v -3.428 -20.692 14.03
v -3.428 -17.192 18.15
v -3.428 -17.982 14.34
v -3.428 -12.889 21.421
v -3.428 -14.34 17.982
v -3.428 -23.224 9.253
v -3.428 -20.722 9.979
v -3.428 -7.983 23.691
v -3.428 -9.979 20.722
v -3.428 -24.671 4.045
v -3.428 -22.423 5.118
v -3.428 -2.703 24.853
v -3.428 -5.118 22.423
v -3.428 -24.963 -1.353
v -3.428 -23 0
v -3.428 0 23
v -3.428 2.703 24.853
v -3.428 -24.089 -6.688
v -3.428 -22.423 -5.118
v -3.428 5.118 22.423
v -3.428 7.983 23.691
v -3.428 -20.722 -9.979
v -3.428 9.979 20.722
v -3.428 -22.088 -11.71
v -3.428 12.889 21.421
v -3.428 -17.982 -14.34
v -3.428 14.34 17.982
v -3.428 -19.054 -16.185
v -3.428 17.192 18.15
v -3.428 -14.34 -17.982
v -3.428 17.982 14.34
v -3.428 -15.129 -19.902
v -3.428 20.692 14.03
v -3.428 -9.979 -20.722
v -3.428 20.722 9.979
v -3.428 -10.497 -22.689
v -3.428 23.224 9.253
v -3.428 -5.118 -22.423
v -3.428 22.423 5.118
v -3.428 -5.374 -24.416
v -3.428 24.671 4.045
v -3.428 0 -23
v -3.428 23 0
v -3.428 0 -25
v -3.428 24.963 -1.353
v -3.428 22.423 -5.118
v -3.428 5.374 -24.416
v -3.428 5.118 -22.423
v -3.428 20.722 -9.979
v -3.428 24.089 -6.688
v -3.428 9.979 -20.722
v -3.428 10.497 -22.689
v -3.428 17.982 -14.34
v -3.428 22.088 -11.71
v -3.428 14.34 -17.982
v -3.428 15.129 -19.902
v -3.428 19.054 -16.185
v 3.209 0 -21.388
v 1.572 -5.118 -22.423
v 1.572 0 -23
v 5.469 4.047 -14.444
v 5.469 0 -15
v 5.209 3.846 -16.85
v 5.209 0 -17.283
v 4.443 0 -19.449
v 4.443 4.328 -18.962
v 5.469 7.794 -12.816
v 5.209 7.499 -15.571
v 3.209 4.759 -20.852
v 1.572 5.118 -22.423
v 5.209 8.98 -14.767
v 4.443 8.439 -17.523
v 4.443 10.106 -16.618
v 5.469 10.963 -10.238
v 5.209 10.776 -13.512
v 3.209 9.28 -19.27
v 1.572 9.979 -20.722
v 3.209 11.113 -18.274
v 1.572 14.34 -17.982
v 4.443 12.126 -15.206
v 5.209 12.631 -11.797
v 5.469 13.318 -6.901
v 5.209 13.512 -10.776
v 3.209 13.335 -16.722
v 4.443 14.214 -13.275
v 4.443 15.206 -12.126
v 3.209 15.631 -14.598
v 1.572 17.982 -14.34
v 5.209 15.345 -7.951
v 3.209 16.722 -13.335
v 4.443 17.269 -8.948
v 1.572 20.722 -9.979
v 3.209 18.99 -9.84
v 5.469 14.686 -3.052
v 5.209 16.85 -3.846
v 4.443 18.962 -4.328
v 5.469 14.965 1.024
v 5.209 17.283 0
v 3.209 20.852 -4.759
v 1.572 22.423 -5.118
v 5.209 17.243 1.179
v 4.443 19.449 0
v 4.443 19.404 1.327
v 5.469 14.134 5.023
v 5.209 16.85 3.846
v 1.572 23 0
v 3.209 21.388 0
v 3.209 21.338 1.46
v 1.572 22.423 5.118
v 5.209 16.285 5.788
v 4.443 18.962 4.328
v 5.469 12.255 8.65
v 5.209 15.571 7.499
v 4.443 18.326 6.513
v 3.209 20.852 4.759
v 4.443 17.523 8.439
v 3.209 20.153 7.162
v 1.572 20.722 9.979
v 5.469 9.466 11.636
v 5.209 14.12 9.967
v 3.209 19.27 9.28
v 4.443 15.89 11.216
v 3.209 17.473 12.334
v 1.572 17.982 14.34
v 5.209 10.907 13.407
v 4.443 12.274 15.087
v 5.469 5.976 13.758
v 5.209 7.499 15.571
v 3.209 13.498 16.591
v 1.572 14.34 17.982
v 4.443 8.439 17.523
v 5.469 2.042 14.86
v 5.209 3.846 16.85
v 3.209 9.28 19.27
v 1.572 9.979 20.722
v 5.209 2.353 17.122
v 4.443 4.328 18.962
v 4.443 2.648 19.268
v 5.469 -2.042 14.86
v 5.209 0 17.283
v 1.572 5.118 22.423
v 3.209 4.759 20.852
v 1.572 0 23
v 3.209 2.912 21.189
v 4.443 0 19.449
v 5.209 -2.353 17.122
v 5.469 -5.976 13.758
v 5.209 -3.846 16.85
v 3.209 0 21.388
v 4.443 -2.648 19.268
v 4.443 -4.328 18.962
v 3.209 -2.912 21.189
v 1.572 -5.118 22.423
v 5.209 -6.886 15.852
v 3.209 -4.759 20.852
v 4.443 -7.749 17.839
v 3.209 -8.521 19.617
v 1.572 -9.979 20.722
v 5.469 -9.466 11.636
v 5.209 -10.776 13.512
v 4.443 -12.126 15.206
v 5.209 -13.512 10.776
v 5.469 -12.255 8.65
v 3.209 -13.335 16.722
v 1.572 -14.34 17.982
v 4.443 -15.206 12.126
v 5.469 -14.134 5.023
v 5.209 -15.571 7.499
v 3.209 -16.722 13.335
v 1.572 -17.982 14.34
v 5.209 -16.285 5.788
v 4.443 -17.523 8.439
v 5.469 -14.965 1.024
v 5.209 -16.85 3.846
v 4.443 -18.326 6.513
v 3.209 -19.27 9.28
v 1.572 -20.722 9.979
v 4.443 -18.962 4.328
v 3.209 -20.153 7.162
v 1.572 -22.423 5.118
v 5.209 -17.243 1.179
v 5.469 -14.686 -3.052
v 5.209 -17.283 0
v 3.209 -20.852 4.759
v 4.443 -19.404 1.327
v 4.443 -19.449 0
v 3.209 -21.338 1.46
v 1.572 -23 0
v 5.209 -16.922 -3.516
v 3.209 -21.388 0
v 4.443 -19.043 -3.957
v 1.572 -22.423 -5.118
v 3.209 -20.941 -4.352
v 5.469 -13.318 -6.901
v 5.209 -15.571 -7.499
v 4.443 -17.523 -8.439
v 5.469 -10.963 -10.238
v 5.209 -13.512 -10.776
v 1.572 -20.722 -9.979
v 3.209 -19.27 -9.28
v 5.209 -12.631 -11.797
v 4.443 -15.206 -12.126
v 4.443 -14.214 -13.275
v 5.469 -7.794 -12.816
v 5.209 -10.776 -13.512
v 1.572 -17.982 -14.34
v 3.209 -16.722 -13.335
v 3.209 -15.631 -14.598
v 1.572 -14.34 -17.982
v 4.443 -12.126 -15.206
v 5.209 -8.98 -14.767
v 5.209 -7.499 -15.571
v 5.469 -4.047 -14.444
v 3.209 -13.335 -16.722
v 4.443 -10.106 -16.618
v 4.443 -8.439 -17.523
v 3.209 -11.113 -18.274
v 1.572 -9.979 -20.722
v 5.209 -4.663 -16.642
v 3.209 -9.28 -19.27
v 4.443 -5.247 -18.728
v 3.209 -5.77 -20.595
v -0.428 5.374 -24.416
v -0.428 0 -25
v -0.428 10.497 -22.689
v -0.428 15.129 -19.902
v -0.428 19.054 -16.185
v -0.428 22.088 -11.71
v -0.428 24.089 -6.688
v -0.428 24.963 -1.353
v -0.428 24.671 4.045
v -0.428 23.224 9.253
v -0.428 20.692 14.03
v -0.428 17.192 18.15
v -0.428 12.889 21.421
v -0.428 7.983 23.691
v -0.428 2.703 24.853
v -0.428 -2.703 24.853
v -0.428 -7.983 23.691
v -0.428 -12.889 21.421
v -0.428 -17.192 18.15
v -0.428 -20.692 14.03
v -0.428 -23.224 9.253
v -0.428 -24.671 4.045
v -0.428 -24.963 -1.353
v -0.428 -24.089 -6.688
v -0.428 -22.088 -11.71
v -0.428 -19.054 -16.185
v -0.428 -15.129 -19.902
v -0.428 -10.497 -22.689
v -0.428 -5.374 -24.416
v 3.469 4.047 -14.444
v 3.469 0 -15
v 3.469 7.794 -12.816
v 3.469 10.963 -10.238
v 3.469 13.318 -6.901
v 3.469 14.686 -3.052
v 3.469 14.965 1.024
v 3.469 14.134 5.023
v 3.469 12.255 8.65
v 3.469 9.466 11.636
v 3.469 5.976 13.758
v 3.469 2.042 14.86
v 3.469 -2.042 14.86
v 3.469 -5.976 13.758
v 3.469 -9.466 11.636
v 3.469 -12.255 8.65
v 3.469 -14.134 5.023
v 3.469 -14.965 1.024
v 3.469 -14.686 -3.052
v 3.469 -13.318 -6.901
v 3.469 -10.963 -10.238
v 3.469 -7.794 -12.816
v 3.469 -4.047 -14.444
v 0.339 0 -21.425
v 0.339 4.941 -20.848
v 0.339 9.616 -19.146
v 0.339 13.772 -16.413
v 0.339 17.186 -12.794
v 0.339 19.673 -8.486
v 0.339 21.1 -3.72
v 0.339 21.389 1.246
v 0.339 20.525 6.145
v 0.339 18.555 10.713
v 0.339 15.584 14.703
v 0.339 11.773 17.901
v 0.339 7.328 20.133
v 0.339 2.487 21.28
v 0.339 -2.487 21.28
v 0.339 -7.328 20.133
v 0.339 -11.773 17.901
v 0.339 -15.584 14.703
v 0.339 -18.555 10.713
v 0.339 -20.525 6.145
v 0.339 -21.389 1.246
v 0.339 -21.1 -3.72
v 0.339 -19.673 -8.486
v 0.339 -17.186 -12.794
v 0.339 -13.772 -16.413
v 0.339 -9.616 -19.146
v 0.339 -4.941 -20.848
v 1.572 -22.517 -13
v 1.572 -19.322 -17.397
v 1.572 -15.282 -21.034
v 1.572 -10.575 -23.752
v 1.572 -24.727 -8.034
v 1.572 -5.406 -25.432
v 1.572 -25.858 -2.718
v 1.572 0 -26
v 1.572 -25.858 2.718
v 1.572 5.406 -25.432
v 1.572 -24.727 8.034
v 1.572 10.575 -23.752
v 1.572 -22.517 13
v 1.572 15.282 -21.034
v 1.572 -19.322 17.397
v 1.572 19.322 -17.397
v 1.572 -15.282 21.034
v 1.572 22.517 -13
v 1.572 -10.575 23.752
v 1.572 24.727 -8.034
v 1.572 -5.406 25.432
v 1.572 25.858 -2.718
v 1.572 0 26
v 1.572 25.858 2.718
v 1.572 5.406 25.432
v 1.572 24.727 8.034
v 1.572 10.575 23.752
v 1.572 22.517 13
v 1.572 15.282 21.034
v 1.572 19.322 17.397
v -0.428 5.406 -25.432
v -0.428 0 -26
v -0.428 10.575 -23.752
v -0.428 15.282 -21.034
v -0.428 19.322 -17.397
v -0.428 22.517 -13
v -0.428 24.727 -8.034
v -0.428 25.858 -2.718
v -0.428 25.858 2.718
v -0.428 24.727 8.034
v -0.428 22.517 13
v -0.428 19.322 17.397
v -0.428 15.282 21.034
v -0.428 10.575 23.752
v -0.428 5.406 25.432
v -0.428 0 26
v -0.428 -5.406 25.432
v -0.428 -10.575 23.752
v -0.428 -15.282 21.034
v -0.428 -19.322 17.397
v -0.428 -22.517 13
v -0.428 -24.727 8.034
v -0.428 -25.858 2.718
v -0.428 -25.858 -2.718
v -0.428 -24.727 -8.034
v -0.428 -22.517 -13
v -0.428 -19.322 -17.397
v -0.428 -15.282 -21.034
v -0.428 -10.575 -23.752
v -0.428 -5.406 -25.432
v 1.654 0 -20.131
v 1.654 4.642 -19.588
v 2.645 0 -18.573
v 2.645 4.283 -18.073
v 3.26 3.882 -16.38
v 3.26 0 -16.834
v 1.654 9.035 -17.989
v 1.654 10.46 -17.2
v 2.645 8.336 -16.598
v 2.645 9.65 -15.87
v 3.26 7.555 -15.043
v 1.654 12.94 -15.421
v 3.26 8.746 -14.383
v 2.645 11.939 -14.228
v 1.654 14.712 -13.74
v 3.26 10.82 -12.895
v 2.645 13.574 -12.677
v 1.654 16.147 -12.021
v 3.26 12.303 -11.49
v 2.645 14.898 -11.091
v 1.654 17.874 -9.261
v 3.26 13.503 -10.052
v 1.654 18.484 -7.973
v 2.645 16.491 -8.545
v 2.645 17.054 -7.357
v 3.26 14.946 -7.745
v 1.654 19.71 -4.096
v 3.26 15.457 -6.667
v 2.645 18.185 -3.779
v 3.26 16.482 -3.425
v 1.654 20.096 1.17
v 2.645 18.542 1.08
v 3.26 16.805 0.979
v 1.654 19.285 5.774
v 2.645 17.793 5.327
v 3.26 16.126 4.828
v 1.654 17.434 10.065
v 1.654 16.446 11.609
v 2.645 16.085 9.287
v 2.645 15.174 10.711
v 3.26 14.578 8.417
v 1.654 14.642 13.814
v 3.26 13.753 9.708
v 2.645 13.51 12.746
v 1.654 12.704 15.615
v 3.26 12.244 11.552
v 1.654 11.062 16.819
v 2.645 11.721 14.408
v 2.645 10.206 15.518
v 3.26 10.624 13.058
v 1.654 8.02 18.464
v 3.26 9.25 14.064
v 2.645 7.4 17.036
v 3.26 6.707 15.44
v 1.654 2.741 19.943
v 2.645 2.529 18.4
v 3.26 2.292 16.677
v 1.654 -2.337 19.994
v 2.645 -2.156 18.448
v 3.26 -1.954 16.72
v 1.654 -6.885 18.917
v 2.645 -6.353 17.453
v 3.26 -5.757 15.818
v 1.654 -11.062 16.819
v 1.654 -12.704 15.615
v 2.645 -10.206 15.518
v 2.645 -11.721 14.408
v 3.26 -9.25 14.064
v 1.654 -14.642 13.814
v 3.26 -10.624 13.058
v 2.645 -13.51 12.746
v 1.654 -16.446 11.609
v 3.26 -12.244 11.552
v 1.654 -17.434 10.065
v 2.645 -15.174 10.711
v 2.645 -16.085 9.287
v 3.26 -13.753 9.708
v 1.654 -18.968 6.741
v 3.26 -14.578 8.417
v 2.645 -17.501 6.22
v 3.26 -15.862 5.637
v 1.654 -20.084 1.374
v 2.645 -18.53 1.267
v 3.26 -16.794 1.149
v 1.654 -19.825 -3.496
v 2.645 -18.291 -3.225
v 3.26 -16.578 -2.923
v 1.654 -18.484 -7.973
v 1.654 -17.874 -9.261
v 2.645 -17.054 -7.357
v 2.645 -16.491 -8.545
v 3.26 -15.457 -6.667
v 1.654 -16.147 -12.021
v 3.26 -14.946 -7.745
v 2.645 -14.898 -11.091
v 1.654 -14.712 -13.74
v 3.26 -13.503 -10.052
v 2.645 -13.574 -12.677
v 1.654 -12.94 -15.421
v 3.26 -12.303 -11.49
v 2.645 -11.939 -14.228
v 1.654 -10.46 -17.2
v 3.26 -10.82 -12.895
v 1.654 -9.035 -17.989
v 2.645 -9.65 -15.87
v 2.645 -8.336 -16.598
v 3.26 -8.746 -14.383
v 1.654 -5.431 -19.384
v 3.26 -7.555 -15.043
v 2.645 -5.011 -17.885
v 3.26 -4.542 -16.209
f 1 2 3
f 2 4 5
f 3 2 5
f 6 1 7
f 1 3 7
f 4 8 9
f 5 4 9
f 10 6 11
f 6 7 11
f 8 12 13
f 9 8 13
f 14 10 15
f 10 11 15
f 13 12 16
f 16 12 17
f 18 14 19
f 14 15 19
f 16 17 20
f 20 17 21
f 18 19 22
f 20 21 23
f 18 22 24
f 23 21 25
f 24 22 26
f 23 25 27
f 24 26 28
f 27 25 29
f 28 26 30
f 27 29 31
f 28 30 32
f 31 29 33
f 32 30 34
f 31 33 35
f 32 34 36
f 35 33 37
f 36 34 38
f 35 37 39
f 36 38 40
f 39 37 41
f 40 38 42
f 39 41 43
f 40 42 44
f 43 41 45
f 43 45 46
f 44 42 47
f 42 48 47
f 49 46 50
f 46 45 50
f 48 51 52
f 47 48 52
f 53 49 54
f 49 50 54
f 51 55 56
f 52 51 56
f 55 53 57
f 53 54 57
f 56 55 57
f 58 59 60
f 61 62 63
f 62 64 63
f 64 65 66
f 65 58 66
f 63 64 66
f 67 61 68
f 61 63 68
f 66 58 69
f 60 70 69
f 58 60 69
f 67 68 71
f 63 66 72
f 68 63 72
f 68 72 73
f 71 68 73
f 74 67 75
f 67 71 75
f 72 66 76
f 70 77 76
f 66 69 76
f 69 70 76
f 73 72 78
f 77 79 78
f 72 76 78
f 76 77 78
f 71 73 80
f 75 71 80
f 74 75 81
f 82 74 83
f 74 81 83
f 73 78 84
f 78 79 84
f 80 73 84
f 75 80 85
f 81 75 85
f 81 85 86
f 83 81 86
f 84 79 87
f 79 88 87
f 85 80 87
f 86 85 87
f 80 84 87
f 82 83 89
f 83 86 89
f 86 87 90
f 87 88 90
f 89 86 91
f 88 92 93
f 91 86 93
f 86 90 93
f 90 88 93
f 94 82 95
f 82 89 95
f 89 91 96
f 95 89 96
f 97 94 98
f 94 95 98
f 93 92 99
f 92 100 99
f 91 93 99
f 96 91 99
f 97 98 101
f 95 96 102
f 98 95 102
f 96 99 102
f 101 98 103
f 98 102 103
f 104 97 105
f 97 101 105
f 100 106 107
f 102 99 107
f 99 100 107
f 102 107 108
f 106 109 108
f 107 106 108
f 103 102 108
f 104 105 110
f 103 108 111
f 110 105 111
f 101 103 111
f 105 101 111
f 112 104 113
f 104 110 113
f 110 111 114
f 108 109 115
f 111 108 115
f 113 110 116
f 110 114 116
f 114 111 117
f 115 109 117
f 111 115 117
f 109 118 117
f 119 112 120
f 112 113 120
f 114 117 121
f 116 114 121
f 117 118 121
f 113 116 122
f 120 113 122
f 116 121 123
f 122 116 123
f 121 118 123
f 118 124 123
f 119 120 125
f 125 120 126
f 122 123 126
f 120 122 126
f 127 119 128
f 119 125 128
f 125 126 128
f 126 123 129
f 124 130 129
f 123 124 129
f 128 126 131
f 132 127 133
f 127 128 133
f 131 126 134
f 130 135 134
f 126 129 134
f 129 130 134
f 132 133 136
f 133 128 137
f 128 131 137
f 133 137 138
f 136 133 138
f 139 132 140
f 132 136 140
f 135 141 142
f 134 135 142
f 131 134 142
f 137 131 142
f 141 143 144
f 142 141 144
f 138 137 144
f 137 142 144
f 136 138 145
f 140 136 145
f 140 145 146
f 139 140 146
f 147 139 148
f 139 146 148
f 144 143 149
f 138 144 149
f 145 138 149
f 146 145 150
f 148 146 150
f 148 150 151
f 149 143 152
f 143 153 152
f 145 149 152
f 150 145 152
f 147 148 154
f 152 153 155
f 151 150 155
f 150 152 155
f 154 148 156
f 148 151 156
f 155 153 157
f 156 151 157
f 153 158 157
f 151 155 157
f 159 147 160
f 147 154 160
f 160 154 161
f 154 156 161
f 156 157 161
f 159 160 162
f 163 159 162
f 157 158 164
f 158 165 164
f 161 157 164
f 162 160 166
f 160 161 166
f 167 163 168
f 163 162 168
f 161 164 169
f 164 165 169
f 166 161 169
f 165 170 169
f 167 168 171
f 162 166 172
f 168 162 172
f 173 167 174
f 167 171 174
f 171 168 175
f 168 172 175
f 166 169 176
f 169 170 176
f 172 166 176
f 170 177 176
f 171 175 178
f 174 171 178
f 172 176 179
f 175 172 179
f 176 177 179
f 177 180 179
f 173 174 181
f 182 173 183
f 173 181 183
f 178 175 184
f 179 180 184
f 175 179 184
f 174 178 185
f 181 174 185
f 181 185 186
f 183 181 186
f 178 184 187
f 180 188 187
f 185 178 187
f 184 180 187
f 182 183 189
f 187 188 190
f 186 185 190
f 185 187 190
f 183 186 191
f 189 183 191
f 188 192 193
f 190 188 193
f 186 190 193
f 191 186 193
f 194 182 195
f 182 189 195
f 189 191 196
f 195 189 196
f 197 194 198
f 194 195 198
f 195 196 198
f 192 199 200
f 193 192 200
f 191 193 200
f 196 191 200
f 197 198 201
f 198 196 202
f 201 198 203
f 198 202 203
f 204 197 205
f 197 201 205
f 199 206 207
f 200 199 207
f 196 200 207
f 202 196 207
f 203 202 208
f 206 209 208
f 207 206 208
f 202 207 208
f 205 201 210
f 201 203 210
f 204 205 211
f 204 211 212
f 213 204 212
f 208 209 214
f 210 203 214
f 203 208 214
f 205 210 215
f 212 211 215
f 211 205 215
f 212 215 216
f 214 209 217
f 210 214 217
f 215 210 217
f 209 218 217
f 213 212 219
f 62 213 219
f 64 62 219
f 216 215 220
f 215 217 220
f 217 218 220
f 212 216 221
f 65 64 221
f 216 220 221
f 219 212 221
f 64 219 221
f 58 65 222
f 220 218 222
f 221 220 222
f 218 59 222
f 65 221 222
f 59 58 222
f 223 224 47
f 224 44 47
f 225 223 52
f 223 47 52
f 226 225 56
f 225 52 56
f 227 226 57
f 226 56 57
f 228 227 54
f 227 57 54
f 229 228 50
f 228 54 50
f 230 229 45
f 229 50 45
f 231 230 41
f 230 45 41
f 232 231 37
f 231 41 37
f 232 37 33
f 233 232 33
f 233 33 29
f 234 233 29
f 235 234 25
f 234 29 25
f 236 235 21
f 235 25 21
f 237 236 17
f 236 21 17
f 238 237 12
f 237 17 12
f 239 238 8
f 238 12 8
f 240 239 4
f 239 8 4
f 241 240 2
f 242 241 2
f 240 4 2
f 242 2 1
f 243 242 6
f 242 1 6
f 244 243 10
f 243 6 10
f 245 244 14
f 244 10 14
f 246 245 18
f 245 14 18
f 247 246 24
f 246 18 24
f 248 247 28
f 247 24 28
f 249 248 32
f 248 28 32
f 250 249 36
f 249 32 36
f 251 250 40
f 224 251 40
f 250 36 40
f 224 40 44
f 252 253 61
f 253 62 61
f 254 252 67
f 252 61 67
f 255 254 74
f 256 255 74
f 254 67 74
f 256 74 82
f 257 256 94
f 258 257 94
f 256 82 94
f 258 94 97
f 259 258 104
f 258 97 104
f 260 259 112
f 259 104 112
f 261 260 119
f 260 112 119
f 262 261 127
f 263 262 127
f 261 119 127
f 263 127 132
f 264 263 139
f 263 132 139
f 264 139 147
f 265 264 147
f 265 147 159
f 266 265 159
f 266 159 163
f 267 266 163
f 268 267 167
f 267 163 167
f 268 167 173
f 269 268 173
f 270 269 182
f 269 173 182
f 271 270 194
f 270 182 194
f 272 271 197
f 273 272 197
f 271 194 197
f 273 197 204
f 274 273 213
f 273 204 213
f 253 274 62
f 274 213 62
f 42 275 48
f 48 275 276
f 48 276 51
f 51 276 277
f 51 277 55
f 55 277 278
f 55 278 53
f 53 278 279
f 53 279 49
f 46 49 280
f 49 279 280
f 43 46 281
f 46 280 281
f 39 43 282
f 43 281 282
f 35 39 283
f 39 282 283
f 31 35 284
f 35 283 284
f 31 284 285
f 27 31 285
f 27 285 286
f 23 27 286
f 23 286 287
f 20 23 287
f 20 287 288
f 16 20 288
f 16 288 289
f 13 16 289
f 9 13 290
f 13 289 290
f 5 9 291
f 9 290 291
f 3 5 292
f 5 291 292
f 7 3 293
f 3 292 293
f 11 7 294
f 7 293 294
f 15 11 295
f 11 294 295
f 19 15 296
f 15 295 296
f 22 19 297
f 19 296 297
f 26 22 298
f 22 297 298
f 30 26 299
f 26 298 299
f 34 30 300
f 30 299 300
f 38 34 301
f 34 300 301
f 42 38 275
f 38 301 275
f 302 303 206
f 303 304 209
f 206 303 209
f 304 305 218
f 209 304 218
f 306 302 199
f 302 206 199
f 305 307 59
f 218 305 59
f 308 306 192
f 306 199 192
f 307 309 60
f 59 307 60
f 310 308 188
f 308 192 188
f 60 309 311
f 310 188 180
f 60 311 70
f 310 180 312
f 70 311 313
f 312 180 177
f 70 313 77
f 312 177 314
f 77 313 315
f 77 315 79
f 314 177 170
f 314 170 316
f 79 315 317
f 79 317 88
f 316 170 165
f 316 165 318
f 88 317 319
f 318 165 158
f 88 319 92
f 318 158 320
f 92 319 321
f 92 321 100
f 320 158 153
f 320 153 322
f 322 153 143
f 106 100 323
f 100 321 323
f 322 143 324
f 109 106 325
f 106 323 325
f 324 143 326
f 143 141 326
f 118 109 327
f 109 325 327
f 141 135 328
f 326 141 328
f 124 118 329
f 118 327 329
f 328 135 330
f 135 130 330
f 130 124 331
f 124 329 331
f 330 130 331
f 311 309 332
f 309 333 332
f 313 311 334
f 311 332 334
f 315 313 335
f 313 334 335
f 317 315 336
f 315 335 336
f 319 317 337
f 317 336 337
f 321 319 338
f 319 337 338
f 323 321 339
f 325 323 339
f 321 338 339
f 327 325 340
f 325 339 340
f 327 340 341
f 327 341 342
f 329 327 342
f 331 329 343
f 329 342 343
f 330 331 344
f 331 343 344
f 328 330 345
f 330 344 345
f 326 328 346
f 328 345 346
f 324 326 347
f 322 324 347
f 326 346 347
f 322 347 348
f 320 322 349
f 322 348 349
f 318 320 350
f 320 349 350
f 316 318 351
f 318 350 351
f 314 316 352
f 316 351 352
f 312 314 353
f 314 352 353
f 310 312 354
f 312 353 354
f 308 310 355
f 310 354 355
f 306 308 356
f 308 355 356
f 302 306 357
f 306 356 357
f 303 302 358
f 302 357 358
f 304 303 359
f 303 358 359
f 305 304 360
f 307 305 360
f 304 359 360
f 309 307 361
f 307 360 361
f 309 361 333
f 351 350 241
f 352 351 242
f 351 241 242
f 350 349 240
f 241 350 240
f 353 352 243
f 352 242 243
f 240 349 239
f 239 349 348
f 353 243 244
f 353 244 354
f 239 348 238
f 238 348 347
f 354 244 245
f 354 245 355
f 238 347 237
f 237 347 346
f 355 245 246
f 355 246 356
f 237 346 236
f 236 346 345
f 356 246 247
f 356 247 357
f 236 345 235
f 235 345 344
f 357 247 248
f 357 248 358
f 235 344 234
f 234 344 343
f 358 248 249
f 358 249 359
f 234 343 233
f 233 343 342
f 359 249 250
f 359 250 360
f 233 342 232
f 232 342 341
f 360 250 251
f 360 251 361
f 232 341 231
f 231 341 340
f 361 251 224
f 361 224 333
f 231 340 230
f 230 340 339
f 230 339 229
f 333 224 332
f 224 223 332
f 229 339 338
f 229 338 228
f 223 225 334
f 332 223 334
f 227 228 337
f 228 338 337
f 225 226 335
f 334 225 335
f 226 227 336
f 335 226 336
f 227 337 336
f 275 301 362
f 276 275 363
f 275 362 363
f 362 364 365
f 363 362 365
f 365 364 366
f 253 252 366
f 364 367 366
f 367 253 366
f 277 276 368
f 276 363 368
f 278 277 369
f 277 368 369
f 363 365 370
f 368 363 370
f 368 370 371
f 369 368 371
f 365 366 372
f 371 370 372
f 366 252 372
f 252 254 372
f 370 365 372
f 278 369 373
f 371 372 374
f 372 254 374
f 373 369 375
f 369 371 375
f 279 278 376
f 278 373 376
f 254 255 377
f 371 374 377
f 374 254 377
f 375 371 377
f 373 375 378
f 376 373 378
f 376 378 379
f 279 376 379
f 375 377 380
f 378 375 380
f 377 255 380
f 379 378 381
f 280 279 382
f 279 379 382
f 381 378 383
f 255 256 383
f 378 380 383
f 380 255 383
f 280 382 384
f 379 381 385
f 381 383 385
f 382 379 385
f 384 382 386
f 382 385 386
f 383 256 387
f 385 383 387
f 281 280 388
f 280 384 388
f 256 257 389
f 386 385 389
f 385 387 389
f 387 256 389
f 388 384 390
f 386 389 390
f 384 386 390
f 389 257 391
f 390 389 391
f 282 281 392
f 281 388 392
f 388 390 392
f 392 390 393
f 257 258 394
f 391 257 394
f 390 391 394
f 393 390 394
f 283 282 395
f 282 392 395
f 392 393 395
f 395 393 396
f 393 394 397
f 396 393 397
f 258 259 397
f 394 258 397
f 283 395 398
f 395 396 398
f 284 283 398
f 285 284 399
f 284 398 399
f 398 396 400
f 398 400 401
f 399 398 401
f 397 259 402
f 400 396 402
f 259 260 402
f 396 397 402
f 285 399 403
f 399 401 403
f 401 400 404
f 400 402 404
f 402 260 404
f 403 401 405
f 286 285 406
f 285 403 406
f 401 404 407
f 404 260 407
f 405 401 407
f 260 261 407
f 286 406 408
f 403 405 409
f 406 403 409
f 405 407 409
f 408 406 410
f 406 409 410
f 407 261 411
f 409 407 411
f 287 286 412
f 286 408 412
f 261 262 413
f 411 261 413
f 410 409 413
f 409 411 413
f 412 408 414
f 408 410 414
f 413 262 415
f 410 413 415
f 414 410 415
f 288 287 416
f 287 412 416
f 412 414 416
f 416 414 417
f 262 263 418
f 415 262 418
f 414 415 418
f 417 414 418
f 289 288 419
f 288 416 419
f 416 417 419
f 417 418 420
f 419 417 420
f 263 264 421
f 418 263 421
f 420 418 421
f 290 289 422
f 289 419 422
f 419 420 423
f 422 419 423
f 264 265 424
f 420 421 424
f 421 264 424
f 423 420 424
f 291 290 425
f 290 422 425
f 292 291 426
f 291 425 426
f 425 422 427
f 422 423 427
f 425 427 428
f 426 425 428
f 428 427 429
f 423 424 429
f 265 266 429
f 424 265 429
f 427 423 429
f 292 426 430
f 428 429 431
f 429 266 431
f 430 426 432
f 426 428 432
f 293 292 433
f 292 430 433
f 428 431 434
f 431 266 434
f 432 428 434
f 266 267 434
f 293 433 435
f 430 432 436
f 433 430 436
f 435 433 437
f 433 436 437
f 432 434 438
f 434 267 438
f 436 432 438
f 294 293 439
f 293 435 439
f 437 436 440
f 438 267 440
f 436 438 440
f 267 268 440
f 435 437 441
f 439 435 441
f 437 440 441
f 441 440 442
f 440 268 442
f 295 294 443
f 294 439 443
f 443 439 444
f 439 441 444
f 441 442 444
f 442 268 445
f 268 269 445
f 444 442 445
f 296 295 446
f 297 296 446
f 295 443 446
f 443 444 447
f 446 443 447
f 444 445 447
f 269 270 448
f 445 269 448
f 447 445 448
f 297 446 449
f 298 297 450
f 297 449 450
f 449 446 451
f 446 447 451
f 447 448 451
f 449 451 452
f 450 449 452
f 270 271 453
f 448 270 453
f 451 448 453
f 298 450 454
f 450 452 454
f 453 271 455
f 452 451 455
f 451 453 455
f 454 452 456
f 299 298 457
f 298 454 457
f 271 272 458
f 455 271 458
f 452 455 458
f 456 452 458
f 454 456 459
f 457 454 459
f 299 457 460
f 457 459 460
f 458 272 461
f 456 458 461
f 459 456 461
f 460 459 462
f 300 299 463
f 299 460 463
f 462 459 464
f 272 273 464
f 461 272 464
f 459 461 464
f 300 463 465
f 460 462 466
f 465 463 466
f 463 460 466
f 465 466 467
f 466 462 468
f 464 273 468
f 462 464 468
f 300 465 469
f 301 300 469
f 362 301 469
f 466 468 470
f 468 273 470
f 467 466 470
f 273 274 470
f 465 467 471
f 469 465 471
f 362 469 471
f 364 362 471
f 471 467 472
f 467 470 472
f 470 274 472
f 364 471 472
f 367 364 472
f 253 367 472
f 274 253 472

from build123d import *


with BuildPart() as part:
    # Sketch1 → Revolve1 (revolve)
    with BuildSketch(Plane(origin=(0, 0, 0), x_dir=(1, 0, 0), z_dir=(0, 1, 0))):
        with BuildLine():
            Line((1.571907147, 25), (1.571907147, 26))
            Line((1.571907147, 26), (-0.428092853, 26))
            Line((-0.428092853, 26), (-0.428092853, 25))
            Line((-0.428092853, 25), (-3.428092853, 25))
            Line((-3.428092853, 25), (-3.428092853, 23))
            Line((-3.428092853, 23), (0.338990058, 21.425225269))
            ThreePointArc((0.338990058, 21.425225269), (2.644708452, 18.573477692), (3.468758659, 15))
            Line((3.468758659, 15), (5.468758659, 15))
            ThreePointArc((5.468758659, 15), (4.4427399, 19.449310388), (1.571907147, 23))
            Line((1.571907147, 23), (1.571907147, 25))
        make_face()
    revolve(axis=Axis((-17.365592853, 0, 0), (1, 0, 0)))


solid = part.part
